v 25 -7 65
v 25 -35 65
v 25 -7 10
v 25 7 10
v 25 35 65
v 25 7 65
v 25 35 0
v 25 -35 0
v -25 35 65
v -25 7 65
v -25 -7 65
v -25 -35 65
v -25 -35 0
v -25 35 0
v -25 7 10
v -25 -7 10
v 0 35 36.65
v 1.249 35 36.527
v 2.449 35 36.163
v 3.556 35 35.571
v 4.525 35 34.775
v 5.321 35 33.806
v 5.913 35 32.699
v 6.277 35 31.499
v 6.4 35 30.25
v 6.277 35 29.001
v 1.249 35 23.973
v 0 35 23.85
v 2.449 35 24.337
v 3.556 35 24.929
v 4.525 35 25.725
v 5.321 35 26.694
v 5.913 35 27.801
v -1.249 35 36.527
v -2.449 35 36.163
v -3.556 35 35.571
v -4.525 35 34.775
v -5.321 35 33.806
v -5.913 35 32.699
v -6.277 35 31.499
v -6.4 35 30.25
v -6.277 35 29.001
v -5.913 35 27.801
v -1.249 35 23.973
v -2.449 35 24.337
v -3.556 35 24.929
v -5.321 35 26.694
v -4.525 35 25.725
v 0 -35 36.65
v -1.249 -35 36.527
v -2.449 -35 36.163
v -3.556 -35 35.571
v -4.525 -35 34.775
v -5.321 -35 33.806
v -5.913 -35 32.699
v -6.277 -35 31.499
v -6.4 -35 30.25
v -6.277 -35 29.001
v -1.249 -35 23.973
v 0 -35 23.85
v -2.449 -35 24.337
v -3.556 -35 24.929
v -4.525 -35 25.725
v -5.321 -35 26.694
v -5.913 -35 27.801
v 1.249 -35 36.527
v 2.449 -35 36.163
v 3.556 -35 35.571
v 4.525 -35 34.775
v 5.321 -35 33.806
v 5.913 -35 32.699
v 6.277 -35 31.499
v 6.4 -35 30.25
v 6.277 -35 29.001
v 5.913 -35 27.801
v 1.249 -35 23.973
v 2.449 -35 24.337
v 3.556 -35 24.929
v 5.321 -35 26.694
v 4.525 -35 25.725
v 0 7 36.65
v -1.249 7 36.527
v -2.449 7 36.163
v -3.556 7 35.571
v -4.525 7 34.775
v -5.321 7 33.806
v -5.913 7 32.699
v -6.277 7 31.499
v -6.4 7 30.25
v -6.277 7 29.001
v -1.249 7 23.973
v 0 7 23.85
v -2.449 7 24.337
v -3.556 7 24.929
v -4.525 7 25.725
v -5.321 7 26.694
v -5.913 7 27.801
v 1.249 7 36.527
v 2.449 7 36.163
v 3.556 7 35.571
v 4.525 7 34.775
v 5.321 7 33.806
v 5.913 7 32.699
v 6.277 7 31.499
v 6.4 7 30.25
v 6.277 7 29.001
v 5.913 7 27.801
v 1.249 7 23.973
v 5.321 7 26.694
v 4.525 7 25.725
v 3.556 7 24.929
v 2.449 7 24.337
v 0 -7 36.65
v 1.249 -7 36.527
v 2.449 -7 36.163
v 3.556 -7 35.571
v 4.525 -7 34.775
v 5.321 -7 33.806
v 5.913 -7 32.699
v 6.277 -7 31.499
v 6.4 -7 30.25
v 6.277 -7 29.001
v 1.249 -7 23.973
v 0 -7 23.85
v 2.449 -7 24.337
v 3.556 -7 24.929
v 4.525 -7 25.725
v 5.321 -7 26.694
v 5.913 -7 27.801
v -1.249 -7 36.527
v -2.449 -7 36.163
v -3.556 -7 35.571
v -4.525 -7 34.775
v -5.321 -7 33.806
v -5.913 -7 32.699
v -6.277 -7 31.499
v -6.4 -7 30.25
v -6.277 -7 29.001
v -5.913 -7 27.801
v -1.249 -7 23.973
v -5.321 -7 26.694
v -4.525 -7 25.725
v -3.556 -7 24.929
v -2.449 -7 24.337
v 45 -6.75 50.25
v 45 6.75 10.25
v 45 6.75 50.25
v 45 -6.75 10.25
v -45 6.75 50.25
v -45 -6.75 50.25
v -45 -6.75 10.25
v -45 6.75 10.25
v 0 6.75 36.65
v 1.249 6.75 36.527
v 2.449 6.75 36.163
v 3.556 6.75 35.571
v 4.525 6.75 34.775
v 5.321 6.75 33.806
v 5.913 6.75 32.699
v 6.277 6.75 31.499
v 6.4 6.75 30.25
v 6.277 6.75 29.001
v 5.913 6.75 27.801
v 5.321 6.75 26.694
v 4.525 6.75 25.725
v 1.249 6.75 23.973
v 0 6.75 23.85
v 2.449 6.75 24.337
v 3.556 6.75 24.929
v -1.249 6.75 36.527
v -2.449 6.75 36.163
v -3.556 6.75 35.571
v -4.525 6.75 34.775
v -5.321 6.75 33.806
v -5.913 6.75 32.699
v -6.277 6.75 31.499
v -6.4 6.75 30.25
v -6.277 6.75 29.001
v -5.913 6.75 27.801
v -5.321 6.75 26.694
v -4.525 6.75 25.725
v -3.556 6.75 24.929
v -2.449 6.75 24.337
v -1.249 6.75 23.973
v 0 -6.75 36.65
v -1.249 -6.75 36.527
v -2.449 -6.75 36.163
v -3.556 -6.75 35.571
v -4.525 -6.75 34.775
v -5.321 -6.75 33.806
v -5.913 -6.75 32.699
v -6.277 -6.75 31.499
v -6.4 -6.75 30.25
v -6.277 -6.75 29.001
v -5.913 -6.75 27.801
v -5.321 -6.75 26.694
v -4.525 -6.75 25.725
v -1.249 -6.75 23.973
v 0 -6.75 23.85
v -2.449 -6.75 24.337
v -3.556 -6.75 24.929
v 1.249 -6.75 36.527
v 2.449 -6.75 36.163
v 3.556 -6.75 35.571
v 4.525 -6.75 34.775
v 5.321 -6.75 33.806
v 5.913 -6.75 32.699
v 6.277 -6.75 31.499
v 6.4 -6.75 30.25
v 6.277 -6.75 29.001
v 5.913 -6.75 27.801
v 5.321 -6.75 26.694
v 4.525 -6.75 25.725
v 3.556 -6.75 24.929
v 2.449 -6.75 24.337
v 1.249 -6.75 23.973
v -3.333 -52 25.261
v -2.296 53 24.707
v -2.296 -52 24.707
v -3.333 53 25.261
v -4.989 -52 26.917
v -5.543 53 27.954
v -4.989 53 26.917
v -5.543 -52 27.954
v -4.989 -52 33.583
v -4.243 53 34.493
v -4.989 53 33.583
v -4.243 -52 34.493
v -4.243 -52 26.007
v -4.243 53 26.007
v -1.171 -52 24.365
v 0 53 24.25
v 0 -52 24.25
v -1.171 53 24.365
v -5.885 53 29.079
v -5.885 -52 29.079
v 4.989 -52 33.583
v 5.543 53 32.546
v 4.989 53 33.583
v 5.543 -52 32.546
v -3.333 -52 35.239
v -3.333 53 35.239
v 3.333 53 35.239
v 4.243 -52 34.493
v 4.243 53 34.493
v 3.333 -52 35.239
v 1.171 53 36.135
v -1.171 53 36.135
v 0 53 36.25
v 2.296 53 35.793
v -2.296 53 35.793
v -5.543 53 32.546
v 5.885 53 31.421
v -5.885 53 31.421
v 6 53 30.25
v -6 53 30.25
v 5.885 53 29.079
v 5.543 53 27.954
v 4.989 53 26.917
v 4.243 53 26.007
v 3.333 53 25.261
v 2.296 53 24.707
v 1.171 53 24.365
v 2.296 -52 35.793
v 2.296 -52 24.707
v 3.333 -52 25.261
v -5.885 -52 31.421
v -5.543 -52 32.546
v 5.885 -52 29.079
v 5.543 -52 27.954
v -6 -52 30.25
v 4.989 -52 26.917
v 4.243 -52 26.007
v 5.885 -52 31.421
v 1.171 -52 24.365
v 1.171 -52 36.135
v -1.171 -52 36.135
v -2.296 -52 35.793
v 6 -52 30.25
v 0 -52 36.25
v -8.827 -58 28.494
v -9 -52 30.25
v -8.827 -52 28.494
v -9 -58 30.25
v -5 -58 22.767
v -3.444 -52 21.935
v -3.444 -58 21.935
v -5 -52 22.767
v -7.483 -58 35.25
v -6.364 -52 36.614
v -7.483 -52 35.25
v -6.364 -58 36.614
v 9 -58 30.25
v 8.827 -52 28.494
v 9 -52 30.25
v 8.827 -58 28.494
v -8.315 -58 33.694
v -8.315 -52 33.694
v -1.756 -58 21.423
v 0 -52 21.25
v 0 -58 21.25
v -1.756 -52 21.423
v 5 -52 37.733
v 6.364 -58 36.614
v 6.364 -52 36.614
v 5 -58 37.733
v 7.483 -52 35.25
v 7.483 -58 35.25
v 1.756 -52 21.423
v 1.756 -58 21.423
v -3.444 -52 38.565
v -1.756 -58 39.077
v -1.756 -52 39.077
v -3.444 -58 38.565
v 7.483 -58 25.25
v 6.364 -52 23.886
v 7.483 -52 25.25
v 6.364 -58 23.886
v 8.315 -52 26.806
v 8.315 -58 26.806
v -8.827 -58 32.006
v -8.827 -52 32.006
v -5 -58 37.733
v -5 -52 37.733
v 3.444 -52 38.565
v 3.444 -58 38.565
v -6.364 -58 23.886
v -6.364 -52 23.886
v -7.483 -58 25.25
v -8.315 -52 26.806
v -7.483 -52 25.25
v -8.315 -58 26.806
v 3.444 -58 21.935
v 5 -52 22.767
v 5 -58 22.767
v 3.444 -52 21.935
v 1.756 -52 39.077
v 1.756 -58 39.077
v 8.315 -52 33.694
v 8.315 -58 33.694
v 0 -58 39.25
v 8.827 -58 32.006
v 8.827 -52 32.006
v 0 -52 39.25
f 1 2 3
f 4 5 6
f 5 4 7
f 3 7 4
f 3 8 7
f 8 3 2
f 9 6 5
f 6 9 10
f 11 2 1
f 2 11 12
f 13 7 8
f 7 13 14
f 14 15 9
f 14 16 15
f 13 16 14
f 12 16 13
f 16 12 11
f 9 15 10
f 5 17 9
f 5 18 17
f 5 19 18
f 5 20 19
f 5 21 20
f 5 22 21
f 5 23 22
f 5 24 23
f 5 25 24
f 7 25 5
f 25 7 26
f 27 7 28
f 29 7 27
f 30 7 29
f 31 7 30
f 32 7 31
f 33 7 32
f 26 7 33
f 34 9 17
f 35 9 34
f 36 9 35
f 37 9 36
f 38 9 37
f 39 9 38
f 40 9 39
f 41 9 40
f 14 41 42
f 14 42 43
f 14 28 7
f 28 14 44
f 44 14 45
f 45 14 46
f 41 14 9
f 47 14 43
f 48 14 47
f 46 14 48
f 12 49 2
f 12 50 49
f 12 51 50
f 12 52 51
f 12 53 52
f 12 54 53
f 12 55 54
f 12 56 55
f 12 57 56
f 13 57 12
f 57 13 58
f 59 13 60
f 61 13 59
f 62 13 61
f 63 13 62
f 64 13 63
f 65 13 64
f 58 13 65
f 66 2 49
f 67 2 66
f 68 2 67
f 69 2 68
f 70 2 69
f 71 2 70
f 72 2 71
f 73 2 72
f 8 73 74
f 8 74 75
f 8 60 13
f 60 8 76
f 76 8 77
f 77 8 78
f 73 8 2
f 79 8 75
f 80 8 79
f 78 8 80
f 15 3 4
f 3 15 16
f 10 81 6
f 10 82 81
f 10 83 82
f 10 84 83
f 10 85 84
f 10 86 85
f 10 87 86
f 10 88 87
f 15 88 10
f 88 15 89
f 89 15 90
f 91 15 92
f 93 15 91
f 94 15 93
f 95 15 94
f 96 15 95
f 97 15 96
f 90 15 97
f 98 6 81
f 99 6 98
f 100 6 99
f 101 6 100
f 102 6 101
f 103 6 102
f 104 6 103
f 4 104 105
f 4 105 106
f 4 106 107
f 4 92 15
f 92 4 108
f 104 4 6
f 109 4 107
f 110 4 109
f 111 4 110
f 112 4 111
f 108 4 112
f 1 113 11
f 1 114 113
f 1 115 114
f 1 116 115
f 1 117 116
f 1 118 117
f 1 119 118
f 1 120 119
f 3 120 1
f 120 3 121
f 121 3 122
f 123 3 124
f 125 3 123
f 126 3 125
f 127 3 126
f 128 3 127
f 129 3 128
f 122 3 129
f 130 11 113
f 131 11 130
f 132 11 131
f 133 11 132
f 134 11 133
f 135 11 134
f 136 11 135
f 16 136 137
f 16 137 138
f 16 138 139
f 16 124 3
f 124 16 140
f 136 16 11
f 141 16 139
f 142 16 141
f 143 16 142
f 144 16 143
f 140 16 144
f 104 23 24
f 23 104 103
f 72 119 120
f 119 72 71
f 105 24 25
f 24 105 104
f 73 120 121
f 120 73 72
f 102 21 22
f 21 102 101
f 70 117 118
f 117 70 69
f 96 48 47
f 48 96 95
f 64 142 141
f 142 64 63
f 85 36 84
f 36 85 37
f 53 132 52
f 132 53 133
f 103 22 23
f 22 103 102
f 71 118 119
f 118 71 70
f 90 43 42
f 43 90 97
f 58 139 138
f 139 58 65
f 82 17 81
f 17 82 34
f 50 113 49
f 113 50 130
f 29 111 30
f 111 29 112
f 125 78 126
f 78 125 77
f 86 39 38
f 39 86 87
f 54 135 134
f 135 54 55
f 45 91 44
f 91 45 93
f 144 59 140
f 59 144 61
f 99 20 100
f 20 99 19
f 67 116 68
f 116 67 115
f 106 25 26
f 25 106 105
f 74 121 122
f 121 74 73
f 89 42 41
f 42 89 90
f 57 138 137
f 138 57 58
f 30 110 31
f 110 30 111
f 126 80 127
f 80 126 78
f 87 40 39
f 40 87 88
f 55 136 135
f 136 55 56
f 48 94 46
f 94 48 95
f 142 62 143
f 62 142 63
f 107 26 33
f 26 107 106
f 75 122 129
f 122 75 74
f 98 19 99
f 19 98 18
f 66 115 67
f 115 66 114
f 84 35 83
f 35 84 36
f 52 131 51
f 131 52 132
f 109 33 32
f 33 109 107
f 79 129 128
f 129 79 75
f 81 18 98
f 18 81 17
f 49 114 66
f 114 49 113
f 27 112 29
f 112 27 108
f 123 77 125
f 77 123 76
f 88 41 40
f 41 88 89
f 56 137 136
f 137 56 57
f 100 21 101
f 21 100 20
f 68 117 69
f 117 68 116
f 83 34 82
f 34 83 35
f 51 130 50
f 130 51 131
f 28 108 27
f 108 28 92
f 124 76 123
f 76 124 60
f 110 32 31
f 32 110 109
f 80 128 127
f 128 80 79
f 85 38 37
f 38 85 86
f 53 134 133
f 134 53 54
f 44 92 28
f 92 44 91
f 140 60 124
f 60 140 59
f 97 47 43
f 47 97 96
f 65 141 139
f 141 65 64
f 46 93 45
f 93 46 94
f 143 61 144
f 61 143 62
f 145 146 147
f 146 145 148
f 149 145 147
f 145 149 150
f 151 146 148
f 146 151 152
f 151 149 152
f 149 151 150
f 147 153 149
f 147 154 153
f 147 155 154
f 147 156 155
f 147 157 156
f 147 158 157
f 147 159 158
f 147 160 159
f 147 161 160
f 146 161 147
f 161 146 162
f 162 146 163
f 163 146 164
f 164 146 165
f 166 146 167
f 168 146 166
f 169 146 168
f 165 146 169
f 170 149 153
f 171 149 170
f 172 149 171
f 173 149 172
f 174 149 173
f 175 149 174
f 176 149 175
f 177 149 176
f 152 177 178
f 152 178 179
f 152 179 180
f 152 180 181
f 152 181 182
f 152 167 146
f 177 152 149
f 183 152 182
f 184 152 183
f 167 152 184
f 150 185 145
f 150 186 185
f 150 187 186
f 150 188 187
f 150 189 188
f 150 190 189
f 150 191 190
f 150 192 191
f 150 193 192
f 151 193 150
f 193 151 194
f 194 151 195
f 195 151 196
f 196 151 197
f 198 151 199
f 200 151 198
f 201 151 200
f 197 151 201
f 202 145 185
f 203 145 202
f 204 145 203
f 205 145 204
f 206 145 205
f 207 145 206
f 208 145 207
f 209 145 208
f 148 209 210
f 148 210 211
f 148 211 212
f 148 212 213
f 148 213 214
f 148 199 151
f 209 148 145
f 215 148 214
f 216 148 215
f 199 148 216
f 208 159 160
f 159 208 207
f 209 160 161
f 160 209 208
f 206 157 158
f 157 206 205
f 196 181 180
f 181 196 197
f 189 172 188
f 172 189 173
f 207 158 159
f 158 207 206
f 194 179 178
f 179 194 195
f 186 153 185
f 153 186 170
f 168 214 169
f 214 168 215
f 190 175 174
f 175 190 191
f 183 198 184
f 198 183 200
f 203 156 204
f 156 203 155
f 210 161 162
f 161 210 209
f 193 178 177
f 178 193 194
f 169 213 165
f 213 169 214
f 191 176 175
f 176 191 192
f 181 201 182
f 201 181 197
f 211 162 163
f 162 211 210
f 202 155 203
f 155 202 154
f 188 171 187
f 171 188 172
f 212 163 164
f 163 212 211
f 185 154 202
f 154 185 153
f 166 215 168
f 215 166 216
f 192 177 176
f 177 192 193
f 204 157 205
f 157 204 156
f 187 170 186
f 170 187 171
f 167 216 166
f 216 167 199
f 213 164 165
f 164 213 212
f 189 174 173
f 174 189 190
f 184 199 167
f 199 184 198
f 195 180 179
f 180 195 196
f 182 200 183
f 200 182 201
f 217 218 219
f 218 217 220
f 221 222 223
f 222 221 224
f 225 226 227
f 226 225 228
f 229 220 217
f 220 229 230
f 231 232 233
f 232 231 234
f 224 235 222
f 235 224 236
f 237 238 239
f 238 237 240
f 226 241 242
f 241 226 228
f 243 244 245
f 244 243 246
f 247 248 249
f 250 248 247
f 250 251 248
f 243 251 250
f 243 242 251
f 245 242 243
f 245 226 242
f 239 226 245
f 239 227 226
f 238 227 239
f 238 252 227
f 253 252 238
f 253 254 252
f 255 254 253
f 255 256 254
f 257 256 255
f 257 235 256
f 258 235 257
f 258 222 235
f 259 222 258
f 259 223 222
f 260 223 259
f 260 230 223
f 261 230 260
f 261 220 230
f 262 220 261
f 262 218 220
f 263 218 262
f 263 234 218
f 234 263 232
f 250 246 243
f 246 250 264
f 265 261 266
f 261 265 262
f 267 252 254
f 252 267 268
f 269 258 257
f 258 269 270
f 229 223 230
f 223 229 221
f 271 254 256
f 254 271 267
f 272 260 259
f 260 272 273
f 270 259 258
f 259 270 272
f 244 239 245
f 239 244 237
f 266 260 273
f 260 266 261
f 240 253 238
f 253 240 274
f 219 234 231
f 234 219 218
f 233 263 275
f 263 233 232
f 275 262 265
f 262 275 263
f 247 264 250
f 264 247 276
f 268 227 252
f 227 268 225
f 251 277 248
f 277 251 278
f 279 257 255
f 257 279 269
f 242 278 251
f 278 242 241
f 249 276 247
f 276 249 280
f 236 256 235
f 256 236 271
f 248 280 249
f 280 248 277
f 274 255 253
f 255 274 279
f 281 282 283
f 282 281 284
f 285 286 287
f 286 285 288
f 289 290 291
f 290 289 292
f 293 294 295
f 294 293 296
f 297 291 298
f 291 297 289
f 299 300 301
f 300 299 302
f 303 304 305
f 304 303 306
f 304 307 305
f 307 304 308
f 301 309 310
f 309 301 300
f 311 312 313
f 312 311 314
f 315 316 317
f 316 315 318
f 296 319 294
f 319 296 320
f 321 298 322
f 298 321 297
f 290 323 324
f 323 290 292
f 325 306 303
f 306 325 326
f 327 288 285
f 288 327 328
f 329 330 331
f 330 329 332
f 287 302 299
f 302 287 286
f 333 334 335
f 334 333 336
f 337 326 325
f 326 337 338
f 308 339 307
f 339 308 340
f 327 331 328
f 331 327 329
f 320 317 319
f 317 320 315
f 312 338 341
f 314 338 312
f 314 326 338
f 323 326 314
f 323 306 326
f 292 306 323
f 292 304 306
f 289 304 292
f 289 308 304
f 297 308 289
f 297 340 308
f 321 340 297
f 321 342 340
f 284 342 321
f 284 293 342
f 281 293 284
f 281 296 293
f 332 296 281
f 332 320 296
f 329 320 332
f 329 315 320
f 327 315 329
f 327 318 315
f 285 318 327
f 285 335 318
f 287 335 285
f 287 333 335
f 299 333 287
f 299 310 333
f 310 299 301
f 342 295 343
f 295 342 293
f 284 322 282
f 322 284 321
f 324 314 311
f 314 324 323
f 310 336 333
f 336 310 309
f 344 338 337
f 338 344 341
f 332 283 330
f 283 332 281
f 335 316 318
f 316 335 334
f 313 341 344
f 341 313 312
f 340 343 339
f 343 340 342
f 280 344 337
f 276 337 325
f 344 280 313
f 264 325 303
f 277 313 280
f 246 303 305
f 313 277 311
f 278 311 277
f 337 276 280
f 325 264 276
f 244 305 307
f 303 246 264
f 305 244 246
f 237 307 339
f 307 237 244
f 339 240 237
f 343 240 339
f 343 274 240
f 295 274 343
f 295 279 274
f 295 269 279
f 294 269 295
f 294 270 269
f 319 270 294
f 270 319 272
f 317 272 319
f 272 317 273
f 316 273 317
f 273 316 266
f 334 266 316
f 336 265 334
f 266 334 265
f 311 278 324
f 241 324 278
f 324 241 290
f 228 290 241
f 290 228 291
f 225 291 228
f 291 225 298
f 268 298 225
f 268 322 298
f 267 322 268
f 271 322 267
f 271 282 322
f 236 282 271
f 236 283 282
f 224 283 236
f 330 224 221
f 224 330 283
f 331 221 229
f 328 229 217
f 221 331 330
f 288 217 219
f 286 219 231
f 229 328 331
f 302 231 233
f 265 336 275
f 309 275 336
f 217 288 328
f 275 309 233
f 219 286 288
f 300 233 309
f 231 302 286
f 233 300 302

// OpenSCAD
$fn = 32;

// ------------------------------------------------------------------------
// Clevis joint: 50 mm clevis, pin d12
// Every part is its own module, assembly() places them once.
// ------------------------------------------------------------------------

// --- part 1 ---
module clevis() {
  difference() {
    translate([-25, -35, 0]) cube([50, 70, 65]);
    translate([-26, -7, 10]) cube([52, 14, 56]);
    translate([0, 0, 30.25]) rotate([90, 0, 0]) cylinder(h = 72, d = 12.8, center = true);
  }
}

// --- part 2 ---
module eye() {
  difference() {
    translate([-45, -6.75, 0]) cube([90, 13.5, 40]);
    translate([0, 0, 20]) rotate([90, 0, 0]) cylinder(h = 15.5, d = 12.8, center = true);
  }
}

// --- part 3 ---
module pin() {
  rotate([0, 90, 0]) cylinder(h = 106, d = 12, center = true);
  translate([-58, 0, 0]) rotate([0, 90, 0]) cylinder(h = 6, d = 18);
}

// --- assembly ---
module assembly() {
  translate([0, 0, 0]) rotate([0, 0, 0]) clevis();
  translate([0, 0, 10.25]) rotate([0, 0, 0]) eye();
  translate([0, 0, 30.25]) rotate([0, 0, 90]) pin();
}

assembly();
